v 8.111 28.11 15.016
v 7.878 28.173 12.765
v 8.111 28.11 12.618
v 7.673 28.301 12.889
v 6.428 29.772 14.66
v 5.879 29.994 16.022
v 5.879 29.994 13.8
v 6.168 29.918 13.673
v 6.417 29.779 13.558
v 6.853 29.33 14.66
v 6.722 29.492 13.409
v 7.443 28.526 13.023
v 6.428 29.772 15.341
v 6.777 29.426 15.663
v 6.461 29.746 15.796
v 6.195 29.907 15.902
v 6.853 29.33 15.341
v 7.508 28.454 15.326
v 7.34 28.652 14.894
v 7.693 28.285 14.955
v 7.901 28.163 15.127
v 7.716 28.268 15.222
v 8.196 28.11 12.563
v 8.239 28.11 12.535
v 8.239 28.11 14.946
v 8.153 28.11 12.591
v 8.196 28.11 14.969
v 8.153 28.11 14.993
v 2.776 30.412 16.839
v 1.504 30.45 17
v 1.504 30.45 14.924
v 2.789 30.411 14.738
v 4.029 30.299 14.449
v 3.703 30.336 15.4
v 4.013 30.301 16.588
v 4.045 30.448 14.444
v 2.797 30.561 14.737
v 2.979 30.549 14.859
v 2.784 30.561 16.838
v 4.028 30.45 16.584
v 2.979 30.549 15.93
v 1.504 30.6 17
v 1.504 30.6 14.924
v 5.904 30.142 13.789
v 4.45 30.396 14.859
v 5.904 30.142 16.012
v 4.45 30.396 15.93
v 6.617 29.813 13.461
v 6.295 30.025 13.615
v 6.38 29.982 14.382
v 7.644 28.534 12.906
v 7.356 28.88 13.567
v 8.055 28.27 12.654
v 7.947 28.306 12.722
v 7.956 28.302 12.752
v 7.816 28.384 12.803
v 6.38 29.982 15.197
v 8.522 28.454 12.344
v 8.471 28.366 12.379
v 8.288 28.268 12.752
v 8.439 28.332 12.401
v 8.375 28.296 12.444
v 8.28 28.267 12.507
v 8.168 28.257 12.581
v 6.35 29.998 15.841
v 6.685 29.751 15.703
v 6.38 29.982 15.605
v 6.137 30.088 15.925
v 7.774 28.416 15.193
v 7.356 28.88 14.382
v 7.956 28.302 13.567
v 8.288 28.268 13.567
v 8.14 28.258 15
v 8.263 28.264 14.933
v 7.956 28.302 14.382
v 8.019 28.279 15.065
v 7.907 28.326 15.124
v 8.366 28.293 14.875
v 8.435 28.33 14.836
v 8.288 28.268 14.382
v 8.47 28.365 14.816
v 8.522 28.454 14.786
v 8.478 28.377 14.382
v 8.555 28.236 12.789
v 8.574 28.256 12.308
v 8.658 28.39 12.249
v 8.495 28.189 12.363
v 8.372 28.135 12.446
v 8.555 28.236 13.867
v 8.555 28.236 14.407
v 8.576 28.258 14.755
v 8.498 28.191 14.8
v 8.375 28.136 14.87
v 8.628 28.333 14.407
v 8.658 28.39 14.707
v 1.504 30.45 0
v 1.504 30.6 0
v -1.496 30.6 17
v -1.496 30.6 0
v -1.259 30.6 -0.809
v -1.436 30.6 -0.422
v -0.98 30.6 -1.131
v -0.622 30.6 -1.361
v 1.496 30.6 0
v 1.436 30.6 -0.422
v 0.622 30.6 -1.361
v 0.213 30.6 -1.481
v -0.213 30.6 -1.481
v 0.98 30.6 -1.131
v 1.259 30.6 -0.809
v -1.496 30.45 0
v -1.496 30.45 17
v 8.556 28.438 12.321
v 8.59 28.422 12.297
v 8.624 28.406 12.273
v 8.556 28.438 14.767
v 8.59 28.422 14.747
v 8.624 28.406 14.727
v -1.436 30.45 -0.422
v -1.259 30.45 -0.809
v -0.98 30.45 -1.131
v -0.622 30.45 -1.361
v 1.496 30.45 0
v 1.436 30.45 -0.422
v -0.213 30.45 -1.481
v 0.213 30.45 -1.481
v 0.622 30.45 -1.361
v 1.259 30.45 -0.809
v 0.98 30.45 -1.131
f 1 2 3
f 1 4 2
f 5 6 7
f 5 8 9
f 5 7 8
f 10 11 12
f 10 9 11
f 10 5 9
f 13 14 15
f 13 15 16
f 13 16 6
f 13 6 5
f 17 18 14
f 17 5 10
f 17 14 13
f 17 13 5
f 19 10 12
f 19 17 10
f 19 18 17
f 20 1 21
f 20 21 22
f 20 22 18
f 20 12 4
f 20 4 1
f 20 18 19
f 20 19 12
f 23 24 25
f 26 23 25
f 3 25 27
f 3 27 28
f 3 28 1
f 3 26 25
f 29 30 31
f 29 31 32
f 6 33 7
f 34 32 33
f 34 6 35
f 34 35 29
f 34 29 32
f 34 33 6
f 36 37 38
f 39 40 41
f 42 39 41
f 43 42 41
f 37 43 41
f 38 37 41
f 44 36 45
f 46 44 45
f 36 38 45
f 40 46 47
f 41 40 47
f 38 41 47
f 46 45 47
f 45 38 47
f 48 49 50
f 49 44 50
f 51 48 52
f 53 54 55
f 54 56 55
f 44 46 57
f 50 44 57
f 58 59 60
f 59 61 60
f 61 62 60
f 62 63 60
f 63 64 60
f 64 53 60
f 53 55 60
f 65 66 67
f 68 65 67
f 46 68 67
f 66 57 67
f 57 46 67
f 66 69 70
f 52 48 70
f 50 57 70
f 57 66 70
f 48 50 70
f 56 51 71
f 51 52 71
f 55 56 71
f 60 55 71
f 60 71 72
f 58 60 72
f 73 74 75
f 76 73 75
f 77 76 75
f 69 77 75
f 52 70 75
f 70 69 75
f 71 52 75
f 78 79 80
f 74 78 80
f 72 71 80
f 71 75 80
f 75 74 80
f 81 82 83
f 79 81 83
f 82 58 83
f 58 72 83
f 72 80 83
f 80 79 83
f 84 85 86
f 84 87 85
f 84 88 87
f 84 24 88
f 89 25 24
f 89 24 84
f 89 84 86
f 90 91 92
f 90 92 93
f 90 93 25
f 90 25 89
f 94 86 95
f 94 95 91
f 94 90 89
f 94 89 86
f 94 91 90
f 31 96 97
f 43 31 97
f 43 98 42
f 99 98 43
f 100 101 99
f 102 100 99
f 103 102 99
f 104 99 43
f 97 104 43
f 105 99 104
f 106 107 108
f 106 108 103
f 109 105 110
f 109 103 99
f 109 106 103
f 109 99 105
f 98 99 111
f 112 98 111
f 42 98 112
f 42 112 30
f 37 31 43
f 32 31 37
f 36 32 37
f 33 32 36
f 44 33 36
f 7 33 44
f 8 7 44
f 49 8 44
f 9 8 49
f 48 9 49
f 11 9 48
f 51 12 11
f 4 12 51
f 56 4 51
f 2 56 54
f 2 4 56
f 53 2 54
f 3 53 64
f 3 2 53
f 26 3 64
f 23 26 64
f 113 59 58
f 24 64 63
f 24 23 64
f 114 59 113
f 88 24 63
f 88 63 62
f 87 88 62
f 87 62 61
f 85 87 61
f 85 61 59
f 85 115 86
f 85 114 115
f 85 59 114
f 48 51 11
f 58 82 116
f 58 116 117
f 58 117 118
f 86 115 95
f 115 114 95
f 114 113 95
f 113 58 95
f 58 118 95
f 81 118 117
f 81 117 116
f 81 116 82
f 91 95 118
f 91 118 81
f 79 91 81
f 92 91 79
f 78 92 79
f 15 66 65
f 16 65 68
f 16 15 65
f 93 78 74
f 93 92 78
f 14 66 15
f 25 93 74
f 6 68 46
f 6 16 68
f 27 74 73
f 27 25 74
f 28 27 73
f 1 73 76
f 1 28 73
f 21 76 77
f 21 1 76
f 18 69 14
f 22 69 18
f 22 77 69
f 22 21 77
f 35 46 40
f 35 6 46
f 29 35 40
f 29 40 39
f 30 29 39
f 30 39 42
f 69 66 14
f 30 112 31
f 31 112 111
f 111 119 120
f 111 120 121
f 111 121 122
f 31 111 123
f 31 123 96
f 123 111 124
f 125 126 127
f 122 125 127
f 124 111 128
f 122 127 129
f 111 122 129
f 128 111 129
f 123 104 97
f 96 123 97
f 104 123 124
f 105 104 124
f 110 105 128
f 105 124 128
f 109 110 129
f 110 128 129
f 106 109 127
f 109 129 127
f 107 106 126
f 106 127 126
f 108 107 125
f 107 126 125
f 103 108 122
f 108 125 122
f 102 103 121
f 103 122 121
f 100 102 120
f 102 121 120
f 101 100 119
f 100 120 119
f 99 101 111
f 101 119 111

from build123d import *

# Parameters (mm, degrees)
EXTRUDE_1_DEPTH     = 17
EXTRUDE_2_DEPTH     = 2.49
CUT_EXTRUDE_1_DEPTH = 20
EXTRUDE_START       = -0.15
EXTRUDE_3_DEPTH     = 0.15


with BuildPart() as part:
    # Эскиз1 → Бобышка-Вытянуть1 (new body)
    with BuildSketch(Plane.XY):
        Polygon((0.003538245, 30.6), (-1.496461755, 30.6), (-1.496461755, 30.45), (1.503538245, 30.45), (1.503538245, 30.6), align=None)
    extrude(amount=EXTRUDE_1_DEPTH)

    # Эскиз5 → Бобышка-Вытянуть2 (add)
    with BuildSketch(Plane(origin=(0, 28.11, 0), x_dir=(1, 0, 0), z_dir=(0, 1, 0))):
        with BuildLine():
            Line((1.503538245, -17), (1.503538245, -14.924455526))
            ThreePointArc((1.503538245, -14.924455526), (5.831161676, -13.82018645), (9.641814145, -11.490666647))
            Line((9.641814145, -11.490666647), (10.970044442, -13.073589874))
            ThreePointArc((10.970044442, -13.073589874), (6.538481504, -15.764164642), (1.503538245, -17))
        make_face()
    extrude(amount=EXTRUDE_2_DEPTH)

    # Эскиз6 → Вырез-Вытянуть1 (cut)
    with BuildSketch(Plane.XY.offset(17)):
        with BuildLine():
            Line((8.521891089, 28.454295213), (8.657616092, 28.390430328))
            add(Edge.make_bspline(
                [(5.879100066, 29.993881439), (6.307843904, 29.938106152), (7.018632939, 29.280475664), (7.690192817, 27.91817908), (8.518003244, 28.170685992), (8.619480263, 28.313699251), (8.648312773, 28.370659008), (8.657616092, 28.390430328)],
                knots=[0, 0, 0, 0, 0.289830958, 0.733667508, 0.815431682, 0.844658315, 0.859635275, 0.859635275, 0.859635275, 0.859635275], degree=3))
            add(Edge.make_bspline(
                [(1.503538245, 30.45), (3.715560515, 30.449991161), (5.879100066, 29.993881439)],
                knots=[0, 0, 0, 1, 1, 1], degree=2))
            Line((1.503538245, 30.45), (1.503538245, 27.864618801))
            Line((1.503538245, 27.864618801), (11.162487636, 27.864618801))
            Line((11.162487636, 27.864618801), (11.137034926, 30.6))
            Line((11.137034926, 30.6), (1.503538844, 30.6))
            add(Edge.make_bspline(
                [(1.503538844, 30.6), (2.978432971, 30.599994106), (4.461182915, 30.445697761), (5.904436507, 30.141836357)],
                knots=[0, 0, 0, 0, 0.998713484, 0.998713484, 0.998713484, 0.998713484], degree=3))
            add(Edge.make_bspline(
                [(5.904436507, 30.141836357), (6.070149185, 30.119558607), (6.403177783, 30.003980968), (6.882223314, 29.594639274), (7.348965788, 28.842434324), (7.801409568, 28.335118852), (8.109877777, 28.252654256), (8.290556261, 28.257818329), (8.426320035, 28.314903679), (8.476599406, 28.368493987), (8.509251117, 28.427432873), (8.521891089, 28.454295213)],
                knots=[0.001207455, 0.001207455, 0.001207455, 0.001207455, 0.108510933, 0.21581441, 0.430421365, 0.64502832, 0.698680058, 0.752331797, 0.805983536, 0.832809405, 0.859635275, 0.859635275, 0.859635275, 0.859635275], degree=3))
        make_face()
    extrude(amount=-CUT_EXTRUDE_1_DEPTH, mode=Mode.SUBTRACT)

    # Эскиз7 → Бобышка-Вытянуть3 (add)
    with BuildSketch(Plane(origin=(0, 30.6, 0), x_dir=(1, 0, 0), z_dir=(0, 1, 0)).offset(EXTRUDE_START)):
        with BuildLine():
            Line((-1.496461755, 0), (1.496461755, 0))
            ThreePointArc((1.496461755, 0), (0, 1.496461755), (-1.496461755, 0))
        make_face()
    extrude(amount=EXTRUDE_3_DEPTH)


solid = part.part
